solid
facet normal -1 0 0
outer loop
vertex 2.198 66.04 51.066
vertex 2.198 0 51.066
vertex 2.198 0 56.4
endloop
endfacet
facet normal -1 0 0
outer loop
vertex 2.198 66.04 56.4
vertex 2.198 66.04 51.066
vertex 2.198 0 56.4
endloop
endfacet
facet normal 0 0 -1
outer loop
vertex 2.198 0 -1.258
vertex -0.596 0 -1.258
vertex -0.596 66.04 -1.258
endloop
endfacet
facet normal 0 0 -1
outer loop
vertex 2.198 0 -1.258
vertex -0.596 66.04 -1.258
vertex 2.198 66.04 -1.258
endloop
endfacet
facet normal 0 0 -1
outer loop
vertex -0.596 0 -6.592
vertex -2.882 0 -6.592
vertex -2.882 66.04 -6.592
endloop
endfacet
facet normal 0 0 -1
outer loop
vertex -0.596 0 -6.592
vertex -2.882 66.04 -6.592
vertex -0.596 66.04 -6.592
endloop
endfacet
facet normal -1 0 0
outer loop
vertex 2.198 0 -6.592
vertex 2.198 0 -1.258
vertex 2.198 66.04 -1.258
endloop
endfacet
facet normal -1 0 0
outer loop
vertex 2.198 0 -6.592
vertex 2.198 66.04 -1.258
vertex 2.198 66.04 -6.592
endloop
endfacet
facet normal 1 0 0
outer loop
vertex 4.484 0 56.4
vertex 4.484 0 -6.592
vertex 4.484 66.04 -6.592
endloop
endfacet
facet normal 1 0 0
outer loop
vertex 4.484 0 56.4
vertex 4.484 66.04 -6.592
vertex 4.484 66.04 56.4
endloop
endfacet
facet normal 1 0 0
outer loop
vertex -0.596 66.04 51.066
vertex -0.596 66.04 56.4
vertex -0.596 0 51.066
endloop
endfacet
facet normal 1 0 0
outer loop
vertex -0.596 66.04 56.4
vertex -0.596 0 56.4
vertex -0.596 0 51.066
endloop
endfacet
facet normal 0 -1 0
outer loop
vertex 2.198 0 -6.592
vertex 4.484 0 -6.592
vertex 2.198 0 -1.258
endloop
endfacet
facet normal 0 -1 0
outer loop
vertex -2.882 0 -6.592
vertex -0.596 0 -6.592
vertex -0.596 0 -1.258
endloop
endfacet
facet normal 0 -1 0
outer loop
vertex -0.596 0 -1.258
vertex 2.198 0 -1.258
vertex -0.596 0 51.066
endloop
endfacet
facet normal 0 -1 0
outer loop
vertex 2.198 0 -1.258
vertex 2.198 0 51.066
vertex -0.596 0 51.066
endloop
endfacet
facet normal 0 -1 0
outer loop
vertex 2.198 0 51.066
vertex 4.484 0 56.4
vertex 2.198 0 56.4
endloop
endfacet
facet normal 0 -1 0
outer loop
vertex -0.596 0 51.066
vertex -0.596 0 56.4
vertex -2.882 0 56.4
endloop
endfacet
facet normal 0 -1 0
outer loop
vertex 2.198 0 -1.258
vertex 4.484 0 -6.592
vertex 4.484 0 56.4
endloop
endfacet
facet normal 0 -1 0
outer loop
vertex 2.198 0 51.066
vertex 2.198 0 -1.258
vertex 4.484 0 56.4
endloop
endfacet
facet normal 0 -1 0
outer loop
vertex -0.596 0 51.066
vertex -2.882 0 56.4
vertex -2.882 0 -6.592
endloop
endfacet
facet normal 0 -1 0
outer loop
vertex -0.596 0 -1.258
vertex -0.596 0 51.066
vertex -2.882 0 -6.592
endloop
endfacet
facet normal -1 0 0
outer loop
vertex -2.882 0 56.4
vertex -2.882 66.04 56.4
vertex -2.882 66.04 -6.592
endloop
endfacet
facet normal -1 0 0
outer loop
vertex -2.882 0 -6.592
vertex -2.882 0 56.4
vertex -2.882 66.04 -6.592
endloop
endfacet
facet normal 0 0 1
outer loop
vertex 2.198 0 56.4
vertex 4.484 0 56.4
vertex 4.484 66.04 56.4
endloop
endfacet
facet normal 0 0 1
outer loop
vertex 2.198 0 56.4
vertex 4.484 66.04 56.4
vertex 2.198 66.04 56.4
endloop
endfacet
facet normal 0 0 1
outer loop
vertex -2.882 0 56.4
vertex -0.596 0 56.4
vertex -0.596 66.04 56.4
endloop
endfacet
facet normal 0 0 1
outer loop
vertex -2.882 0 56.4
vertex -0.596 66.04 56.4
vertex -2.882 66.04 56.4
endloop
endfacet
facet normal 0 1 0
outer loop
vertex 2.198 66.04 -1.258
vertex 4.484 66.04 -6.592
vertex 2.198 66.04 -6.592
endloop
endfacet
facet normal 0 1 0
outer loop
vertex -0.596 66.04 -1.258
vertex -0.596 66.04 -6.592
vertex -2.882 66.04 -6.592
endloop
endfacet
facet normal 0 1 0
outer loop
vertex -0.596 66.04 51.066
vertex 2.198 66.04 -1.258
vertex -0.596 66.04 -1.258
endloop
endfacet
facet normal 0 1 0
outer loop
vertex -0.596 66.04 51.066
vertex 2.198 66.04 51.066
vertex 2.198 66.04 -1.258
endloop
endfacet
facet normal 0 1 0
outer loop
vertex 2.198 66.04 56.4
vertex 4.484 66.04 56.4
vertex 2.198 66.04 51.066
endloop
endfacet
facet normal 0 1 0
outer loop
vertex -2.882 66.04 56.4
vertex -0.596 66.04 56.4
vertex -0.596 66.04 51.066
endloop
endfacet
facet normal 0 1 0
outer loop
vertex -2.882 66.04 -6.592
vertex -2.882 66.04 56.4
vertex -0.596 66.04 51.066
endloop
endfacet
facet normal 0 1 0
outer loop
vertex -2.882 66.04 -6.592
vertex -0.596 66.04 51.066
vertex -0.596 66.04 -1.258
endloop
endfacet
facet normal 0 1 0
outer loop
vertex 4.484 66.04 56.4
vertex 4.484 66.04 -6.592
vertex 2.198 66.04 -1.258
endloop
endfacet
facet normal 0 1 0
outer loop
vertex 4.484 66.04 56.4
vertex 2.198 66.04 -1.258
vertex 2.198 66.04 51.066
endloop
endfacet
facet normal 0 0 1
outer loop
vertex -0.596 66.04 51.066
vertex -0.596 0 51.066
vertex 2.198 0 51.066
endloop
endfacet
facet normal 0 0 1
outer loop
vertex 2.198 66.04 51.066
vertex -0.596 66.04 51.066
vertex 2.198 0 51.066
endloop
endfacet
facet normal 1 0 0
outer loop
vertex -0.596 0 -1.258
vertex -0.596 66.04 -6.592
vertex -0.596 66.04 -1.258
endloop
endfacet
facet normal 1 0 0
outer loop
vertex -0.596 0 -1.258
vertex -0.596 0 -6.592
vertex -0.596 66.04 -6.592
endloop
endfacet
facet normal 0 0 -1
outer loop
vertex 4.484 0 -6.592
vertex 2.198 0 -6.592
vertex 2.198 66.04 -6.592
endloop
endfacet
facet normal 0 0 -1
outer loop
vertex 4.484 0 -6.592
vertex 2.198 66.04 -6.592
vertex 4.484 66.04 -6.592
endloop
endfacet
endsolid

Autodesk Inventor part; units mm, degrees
ref_plane "YZ Plane" through (0, 0, 0) normal (1, 0, 0) x (0, 1, 0)
ref_plane "XZ Plane" through (0, 0, 0) normal (0, 1, 0) x (-1, 0, 0)
ref_plane "XY Plane" through (0, 0, 0) normal (0, 0, 1) x (1, 0, 0)
sketch "Sketch1" plane through (0, 0, 0) normal (0, 1, 0) x (-1, 0, 0)
  line L0 (2.8823, 56.4) -> (2.8823, -6.592)
  line L1 (-4.4837, -6.592) -> (-4.4837, 56.4)
  line L2 (0.5963, 56.4) -> (0.5963, 51.066)
  line L3 (0.5963, 51.066) -> (-2.1977, 51.066)
  line L4 (-2.1977, 51.066) -> (-2.1977, 56.4)
  line L5 (0.5963, -6.592) -> (0.5963, -1.258)
  line L6 (0.5963, -1.258) -> (-2.1977, -1.258)
  line L7 (-2.1977, -1.258) -> (-2.1977, -6.592)
  line L8 (-4.4837, 56.4) -> (-2.1977, 56.4)
  line L9 (0.5963, 56.4) -> (2.8823, 56.4)
  line L10 (2.8823, -6.592) -> (0.5963, -6.592)
  line L11 (-2.1977, -6.592) -> (-4.4837, -6.592)
  point P0 (0, 0)
  dimension "d0" = 7.366
  dimension "d1" = 62.992
  dimension "d2" = 2.286
  dimension "d3" = 2.286
  dimension "d5" = 2.286
  dimension "d6" = 2.286
  dimension "d7" = 5.334
  dimension "d8" = 5.334
  dimension "d9" = 5.334
  dimension "d10" = 5.334
extrude "Extrusion1" add sketch "Sketch1" along normal blind 66.04
properties part number "ceiling_case_cover"
